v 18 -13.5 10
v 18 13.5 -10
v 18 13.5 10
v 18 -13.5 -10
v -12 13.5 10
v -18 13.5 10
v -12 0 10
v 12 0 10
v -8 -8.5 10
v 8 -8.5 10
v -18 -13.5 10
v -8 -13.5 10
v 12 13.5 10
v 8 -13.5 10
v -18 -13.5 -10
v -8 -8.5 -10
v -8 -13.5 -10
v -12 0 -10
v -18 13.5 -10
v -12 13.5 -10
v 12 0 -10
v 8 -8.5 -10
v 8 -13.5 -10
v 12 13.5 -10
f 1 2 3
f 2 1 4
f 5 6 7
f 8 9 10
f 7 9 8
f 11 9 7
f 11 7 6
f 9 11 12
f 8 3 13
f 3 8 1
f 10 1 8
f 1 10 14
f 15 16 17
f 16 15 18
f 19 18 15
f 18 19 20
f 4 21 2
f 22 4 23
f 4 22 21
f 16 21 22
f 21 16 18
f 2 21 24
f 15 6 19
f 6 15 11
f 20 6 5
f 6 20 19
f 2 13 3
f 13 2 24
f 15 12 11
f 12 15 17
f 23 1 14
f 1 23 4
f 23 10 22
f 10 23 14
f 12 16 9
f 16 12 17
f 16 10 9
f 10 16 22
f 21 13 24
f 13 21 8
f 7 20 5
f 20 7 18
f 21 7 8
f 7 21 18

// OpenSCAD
module iec_power_inlet() {
    difference() {
        // Main body
        cube([36, 27, 20], center = true);
        
        // Cutout for the fuse holder
        translate([-8, -13.5, -10])
            cube([16, 5, 20], center = false);
        
        // Cutout for the power socket
        translate([-12, 0, -10])
            cube([24, 27, 20], center = false);
    }
}

iec_power_inlet();
